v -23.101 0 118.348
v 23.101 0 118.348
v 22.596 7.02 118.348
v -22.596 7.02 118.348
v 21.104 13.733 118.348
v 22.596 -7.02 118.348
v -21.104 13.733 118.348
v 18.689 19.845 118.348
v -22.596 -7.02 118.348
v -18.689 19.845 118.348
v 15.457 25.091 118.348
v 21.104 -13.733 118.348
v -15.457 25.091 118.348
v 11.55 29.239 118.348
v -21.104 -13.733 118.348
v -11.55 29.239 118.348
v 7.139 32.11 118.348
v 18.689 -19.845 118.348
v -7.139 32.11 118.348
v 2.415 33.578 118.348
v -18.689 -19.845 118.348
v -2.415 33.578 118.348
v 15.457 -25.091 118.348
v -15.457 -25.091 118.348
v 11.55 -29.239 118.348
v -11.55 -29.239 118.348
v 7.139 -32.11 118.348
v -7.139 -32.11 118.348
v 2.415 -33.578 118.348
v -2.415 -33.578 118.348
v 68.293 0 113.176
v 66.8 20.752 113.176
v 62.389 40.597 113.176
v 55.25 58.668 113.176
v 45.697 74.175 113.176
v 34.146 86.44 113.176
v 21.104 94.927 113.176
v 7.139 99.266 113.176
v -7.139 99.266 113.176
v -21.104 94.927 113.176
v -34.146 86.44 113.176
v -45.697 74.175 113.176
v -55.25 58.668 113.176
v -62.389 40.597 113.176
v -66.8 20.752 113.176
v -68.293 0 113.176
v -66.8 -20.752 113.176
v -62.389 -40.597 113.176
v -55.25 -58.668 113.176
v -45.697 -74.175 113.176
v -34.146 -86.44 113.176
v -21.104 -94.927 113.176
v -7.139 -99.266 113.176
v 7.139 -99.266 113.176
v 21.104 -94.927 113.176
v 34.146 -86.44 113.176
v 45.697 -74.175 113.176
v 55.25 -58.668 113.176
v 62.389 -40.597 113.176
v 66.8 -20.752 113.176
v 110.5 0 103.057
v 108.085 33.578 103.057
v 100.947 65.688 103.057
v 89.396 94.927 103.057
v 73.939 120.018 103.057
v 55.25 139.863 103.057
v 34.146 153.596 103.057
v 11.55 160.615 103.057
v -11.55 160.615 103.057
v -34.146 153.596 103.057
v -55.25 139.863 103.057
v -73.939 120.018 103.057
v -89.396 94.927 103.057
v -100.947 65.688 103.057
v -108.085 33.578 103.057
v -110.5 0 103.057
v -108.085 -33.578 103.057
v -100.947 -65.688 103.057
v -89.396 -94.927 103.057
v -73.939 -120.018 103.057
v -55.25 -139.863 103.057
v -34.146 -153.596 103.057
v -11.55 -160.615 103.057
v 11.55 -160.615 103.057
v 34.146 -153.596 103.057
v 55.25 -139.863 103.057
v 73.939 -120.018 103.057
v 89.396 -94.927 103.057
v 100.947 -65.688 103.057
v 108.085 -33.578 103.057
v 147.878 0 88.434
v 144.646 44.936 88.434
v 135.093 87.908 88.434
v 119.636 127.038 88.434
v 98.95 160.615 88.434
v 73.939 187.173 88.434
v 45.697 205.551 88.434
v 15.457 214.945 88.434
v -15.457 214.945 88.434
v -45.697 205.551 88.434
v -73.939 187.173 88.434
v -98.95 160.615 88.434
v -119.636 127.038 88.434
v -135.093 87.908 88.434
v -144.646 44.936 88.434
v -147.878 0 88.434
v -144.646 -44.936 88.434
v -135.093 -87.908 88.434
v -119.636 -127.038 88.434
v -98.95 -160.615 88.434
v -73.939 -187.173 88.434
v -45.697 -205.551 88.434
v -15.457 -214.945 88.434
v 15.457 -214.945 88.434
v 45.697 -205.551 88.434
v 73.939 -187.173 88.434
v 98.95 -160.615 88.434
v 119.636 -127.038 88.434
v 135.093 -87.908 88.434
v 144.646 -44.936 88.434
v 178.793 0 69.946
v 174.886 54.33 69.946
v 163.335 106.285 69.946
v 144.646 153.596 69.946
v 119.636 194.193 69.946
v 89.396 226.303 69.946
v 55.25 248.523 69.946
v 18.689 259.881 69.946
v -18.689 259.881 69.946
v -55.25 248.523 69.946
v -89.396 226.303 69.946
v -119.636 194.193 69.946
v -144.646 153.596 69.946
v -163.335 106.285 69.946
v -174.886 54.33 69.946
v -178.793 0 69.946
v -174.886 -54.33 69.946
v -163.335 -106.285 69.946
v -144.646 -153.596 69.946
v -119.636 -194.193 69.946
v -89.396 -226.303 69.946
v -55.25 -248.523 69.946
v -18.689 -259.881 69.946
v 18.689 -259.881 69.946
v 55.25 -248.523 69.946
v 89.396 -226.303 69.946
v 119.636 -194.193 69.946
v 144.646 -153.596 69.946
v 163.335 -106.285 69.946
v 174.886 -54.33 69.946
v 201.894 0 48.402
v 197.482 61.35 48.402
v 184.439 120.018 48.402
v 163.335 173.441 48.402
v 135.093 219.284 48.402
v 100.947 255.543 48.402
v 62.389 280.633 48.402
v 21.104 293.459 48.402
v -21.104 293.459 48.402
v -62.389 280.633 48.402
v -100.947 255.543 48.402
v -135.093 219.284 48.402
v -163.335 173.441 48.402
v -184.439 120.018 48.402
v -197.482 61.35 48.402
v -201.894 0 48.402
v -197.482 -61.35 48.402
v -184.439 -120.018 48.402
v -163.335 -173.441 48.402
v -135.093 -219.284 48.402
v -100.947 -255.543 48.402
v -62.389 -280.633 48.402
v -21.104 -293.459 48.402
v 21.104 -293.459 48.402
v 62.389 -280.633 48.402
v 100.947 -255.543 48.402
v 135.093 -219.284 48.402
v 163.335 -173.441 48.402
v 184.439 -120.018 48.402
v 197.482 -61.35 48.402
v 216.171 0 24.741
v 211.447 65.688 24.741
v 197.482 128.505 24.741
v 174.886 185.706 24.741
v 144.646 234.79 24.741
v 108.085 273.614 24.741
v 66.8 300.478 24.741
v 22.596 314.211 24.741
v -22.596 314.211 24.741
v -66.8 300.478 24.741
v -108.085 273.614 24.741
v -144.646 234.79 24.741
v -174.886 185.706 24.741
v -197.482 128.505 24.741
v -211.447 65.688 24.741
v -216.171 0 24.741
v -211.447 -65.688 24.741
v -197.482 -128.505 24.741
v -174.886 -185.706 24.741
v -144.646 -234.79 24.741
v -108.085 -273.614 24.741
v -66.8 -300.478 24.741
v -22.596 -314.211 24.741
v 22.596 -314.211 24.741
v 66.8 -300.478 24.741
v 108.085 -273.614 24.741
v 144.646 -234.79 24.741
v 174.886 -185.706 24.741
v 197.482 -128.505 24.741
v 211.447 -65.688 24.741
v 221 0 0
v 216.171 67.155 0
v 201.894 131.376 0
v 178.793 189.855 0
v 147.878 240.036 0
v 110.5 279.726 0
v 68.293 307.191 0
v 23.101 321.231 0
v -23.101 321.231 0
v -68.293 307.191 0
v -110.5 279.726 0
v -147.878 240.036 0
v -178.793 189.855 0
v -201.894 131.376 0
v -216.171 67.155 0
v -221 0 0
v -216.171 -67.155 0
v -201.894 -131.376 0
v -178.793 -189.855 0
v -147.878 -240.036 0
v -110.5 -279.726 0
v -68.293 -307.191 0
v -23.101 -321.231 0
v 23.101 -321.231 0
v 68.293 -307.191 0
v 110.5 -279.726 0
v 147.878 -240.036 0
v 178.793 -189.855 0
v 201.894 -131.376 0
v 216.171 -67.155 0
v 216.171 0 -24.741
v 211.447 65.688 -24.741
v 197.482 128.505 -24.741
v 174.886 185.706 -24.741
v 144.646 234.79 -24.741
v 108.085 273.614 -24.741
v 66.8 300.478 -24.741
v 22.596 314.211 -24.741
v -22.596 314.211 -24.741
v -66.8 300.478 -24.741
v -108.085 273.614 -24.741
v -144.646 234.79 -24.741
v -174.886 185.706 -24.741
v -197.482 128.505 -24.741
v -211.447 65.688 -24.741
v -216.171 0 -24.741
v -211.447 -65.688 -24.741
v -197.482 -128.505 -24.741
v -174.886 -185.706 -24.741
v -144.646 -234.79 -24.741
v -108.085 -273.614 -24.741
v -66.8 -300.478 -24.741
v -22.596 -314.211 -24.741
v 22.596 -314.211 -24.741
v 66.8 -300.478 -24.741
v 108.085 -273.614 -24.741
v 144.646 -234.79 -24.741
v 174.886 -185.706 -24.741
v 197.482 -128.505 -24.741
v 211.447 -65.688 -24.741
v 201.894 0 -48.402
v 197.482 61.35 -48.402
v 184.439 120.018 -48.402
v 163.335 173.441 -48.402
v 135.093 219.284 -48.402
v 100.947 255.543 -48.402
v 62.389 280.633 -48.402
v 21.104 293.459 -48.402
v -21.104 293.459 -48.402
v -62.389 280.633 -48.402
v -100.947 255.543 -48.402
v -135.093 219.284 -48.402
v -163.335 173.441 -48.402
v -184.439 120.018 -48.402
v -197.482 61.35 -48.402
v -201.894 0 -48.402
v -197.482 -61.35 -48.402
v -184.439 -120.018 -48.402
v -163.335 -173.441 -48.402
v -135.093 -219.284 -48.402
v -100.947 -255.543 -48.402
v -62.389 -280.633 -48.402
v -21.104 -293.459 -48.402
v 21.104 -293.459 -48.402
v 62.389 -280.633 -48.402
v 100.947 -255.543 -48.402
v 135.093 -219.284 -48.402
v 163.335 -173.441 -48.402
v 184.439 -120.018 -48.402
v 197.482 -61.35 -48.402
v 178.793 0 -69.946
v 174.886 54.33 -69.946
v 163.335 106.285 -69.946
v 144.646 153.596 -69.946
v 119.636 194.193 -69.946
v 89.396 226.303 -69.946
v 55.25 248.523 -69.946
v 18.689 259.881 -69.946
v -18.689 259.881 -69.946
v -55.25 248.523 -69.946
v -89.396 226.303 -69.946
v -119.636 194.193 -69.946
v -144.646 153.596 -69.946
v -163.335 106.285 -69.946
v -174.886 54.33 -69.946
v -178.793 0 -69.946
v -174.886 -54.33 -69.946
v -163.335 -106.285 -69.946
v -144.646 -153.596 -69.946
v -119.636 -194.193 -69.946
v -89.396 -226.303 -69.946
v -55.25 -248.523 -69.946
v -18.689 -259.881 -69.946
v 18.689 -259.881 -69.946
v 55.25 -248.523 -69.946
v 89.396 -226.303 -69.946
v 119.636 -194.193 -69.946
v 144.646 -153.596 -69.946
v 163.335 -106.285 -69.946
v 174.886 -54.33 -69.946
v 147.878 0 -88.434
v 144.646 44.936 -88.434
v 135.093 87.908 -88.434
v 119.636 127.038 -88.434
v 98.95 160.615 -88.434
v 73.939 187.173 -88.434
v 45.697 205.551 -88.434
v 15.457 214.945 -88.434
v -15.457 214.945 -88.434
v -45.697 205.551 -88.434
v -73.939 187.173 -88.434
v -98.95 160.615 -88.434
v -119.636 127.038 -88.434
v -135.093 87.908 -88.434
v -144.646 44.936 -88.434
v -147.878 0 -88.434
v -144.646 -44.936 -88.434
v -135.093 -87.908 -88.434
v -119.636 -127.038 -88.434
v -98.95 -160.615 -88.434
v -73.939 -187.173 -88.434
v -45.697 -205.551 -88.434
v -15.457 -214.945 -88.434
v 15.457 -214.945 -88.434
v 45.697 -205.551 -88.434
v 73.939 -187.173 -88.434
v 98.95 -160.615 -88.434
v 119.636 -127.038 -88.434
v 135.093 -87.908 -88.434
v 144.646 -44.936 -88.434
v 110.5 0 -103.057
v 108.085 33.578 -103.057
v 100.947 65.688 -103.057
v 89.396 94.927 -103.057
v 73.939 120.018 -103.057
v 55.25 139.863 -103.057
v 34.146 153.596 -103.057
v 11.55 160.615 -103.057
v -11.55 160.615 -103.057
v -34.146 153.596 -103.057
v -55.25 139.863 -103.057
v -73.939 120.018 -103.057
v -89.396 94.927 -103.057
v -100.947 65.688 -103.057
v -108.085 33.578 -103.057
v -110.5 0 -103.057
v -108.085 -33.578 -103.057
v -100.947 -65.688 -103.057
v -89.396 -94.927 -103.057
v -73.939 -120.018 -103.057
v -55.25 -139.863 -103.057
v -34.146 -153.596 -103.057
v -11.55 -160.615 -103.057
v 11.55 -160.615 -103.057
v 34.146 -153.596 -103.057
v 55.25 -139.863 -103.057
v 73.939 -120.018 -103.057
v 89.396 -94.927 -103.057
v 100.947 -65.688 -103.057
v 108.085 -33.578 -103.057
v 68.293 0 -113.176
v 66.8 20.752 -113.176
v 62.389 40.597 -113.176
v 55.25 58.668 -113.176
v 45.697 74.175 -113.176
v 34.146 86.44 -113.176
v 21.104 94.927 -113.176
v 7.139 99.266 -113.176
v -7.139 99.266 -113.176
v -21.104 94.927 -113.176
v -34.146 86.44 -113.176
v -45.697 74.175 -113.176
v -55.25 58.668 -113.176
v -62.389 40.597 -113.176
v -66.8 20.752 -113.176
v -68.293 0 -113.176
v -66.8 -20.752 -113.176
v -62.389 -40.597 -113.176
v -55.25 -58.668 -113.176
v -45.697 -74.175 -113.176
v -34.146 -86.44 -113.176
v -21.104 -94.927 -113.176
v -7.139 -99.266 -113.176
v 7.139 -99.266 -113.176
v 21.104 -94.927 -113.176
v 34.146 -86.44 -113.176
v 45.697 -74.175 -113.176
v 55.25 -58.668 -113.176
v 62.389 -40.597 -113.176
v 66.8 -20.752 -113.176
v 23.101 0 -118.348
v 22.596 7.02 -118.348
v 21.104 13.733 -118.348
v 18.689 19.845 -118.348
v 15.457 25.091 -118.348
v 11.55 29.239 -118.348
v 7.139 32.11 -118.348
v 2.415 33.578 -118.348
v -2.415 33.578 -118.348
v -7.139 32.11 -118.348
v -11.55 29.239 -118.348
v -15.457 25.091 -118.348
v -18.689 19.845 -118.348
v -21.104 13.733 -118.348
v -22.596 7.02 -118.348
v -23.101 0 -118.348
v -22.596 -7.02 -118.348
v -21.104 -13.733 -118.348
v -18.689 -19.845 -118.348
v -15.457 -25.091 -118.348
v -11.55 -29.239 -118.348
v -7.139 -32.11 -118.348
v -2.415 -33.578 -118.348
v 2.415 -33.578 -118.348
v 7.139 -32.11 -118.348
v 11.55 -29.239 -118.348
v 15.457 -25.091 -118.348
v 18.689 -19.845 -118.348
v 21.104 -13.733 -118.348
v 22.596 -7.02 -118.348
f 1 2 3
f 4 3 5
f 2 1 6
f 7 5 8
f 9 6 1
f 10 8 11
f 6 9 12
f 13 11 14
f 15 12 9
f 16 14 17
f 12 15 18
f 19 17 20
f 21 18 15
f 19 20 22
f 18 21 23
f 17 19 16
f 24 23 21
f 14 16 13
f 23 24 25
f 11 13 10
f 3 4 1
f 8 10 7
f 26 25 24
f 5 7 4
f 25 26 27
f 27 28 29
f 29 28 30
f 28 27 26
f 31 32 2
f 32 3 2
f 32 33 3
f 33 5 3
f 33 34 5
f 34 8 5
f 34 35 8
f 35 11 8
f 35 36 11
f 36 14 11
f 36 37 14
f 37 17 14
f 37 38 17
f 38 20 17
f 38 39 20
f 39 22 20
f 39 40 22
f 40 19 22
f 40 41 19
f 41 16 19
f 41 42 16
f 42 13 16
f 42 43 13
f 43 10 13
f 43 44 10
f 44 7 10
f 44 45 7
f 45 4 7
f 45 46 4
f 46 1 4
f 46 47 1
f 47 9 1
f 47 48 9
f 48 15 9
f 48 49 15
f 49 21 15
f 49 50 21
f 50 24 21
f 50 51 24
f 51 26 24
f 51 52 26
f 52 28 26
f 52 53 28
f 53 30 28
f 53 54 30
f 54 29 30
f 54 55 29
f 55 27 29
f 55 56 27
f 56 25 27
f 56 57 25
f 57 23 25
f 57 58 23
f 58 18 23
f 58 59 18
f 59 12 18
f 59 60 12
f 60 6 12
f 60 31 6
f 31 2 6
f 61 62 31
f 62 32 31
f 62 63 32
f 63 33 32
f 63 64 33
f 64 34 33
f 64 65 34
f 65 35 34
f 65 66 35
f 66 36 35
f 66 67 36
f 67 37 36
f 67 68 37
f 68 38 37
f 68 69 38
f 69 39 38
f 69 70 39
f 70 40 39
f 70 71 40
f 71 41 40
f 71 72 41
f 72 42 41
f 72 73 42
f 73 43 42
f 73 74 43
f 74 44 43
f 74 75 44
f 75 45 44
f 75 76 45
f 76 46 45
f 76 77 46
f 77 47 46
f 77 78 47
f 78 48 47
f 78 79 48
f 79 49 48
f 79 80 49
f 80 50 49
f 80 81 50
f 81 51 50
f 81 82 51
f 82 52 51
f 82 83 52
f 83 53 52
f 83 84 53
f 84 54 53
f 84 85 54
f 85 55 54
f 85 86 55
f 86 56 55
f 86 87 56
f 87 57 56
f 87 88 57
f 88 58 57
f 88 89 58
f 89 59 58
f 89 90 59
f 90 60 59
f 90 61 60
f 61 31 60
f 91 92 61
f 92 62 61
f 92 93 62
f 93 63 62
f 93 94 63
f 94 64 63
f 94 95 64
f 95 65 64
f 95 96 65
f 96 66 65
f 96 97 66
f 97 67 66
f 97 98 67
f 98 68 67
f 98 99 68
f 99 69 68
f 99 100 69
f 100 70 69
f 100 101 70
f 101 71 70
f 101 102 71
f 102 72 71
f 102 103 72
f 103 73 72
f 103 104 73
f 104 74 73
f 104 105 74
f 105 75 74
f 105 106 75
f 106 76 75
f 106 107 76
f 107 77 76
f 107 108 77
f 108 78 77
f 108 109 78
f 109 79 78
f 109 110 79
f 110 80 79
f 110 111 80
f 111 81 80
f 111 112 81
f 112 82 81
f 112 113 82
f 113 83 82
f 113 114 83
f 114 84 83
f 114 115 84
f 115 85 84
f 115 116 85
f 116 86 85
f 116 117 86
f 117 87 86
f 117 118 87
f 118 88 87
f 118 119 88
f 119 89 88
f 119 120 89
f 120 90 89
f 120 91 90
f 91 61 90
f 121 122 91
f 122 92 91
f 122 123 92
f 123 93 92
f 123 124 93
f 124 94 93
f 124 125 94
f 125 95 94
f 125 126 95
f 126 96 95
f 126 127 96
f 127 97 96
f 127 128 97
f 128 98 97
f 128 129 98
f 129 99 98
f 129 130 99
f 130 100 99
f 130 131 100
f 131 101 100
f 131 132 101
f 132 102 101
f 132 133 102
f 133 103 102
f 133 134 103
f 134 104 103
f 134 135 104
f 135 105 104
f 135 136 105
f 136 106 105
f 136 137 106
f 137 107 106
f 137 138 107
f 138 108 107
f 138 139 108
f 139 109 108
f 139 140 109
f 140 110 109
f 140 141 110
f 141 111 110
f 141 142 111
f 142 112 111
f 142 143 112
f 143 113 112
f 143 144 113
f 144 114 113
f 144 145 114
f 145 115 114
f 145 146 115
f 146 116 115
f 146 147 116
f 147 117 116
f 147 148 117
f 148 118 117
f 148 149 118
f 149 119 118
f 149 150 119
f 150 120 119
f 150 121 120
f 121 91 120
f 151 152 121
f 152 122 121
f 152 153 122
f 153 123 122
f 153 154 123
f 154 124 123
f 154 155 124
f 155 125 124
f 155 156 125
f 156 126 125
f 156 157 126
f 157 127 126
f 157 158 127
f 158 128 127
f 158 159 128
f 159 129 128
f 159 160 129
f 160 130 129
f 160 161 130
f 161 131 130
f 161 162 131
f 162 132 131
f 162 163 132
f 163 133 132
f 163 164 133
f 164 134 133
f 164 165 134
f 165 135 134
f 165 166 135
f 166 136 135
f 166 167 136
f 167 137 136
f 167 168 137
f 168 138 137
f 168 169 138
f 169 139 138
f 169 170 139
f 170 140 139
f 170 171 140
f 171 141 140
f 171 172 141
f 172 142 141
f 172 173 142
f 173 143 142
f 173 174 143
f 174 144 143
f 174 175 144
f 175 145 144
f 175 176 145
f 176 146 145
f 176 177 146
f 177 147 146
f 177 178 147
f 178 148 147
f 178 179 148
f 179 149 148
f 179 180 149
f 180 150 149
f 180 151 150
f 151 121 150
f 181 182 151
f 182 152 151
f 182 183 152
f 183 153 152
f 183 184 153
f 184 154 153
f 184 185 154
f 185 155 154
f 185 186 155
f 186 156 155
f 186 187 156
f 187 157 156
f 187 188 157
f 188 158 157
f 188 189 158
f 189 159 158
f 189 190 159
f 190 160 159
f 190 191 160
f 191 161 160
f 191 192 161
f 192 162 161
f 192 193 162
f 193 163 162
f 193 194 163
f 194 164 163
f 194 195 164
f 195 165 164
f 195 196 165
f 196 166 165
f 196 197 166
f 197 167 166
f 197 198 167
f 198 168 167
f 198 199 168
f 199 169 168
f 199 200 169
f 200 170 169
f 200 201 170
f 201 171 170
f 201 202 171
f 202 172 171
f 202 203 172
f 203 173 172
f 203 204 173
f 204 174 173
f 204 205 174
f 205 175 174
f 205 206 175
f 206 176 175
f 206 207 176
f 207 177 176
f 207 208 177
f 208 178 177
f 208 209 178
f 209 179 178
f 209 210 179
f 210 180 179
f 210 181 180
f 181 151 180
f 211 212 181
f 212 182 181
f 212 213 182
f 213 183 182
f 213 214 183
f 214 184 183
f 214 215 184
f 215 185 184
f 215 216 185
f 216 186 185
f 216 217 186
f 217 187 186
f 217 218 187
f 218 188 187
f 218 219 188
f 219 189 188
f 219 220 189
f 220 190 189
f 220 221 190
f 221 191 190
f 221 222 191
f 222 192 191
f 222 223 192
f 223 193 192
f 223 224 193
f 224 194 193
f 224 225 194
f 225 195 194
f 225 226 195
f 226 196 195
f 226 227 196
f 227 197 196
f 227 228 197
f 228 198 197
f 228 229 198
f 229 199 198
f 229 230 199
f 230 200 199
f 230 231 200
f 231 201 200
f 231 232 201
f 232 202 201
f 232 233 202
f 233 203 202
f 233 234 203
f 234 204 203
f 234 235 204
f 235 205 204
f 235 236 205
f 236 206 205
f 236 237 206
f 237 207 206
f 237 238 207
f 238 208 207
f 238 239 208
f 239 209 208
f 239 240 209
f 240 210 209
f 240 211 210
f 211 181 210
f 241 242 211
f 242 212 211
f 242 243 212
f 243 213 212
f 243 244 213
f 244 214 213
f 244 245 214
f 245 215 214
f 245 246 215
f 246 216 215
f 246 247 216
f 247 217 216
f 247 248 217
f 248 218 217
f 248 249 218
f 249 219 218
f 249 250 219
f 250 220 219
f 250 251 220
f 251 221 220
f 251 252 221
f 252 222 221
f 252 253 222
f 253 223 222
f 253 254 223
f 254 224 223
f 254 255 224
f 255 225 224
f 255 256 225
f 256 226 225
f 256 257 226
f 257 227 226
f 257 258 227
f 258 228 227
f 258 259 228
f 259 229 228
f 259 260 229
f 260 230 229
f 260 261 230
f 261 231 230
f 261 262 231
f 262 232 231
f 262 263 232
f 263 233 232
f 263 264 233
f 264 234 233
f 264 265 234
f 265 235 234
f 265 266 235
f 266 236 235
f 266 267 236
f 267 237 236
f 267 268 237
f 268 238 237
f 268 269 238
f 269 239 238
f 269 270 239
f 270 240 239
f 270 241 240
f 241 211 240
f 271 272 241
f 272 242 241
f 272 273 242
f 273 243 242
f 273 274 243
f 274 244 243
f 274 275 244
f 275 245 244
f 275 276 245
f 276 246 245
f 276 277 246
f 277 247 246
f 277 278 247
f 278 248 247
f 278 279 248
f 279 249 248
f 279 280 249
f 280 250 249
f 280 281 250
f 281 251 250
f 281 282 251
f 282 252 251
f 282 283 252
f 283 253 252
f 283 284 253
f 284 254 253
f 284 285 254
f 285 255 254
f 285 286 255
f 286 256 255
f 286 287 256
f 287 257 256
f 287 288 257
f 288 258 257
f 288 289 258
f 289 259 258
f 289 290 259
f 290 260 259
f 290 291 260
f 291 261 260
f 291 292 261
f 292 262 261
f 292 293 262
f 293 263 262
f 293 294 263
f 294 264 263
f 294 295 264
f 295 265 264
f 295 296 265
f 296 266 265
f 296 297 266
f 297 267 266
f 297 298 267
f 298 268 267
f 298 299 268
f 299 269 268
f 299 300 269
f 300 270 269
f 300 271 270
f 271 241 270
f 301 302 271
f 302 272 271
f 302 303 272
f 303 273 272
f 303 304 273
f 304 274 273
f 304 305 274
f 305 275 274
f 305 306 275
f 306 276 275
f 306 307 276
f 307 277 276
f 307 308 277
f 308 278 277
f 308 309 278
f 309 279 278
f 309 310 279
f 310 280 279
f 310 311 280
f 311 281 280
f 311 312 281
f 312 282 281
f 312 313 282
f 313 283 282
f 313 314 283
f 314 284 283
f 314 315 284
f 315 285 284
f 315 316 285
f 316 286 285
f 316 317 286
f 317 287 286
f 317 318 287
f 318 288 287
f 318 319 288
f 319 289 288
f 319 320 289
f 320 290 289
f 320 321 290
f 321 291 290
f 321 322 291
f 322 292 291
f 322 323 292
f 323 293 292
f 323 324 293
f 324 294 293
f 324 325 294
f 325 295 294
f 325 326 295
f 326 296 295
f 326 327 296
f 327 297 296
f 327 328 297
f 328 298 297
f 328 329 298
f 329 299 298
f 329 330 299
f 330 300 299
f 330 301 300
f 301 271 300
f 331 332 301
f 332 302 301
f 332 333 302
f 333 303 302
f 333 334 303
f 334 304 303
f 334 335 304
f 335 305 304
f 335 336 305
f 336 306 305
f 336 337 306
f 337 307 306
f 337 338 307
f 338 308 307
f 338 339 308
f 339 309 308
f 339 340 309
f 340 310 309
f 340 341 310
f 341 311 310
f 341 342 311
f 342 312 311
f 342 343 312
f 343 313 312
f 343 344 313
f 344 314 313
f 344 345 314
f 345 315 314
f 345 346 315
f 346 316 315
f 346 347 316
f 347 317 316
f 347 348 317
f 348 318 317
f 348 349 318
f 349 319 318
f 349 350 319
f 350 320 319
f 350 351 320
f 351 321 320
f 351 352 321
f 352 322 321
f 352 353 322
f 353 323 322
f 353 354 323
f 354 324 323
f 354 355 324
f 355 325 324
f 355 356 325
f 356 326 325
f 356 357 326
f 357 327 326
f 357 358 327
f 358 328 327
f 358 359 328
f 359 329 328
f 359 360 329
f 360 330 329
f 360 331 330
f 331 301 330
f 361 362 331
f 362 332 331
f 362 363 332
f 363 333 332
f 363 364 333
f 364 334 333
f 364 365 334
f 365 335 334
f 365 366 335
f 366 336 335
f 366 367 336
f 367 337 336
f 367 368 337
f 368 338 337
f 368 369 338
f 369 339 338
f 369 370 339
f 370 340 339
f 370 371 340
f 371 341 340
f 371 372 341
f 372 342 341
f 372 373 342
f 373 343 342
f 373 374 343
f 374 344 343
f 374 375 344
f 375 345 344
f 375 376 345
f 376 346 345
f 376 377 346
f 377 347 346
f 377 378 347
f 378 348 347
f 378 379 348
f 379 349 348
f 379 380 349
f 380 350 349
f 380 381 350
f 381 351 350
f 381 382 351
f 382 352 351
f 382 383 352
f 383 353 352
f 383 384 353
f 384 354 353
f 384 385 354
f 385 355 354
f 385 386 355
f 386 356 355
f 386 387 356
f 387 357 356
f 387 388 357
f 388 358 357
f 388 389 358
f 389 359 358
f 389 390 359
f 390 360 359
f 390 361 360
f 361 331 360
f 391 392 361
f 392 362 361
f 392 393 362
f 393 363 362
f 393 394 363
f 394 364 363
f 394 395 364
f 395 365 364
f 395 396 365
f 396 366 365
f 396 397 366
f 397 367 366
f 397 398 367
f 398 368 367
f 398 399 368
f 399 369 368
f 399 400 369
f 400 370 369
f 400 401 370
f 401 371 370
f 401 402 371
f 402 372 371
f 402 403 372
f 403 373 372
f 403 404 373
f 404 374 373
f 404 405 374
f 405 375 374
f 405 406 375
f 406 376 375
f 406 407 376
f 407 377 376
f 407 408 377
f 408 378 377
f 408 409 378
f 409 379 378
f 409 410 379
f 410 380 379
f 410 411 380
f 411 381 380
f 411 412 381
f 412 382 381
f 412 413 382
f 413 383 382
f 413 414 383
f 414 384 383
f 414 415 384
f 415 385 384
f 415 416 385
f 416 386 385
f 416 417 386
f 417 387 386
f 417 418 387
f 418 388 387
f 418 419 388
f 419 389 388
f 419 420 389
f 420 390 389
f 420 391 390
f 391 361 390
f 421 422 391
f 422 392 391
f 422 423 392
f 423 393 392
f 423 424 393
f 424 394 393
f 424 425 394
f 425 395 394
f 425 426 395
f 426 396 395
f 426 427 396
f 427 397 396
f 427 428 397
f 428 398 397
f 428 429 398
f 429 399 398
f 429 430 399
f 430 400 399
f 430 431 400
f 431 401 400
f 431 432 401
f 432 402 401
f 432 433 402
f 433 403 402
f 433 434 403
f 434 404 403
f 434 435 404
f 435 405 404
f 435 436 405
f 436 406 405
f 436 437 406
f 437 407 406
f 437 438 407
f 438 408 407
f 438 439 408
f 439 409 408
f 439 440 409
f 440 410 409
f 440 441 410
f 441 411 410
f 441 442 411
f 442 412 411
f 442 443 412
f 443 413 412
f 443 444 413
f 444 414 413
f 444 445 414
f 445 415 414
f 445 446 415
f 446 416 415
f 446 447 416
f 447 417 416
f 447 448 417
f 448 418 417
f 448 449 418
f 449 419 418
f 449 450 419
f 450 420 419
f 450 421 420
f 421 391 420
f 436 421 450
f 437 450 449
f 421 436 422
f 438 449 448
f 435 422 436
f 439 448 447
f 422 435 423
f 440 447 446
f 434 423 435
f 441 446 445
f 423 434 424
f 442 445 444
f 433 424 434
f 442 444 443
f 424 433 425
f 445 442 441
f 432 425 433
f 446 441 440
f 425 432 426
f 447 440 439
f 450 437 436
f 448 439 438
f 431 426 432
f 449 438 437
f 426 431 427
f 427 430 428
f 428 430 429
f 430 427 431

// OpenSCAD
// Generated by SolidPython 1.0.1 on 2020-07-29 00:46:51


scale(v = [13, 19, 7]) {
	sphere(r = 17);
}
/***********************************************
*********      SolidPython code:      **********
************************************************
 
# import packages: SolidPython
from solid import *
from solid.utils import *
from itertools import chain, combinations, permutations


class Resize:

    def __init__(self, scad_file):
        self.scad_file = scad_file
        #self.scad_file = import_scad(scad_file)
        # cone/cylinder param:
        self.r1 = 0
        self.r2 = 0
        self.h = 0
        # rectangular prism param:
        self.w = 0
        self.l = 0
        # ellipse param:
        self.r = 0

    # import OpenScad code (file name corresponds to shape)


    # classify shape + parameters
    def assign(self, param1, param2, param3):
        if self.scad_file == 'cone.scad':
            self.r1 = param1
            self.r2 = param2
            self.h = param3
        elif self.scad_file == 'cylinder.scad':
            self.r1 = param1
            self.r2 = param2
            self.h = param3
        elif self.scad_file == 'rectangularPrism.scad':
            self.h = param1
            self.l = param2
            self.w = param3
        else:
            self.r = param1
            self.h = param2

    # resize parameters
    def iterate(self):
        x = range(3, 20, 2)
        i = 1
        if self.scad_file == 'cone.scad':
            tempList = list(permutations(x, 2))
            for temp in tempList:
                param1 = temp[0]
                param2 = temp[1]
                filepath = 'produced_scad_files/' + 'cone' + str(param1) + '_' + str(param2) + '_' + '.scad'
                scad_render_to_file(cylinder(h=param1, r1=param2, r2=0), filepath)

        elif self.scad_file == 'cylinder.scad':
            tempList = list(permutations(x, 3))
            for temp in tempList:
                param1 = temp[0]
                param2 = temp[1]
                filepath = 'produced_scad_files/' + 'cylinder' + str(param1) + '_' + str(param2) + '_' + '.scad'
                scad_render_to_file(cylinder(h=param1, r1=param2, r2=param2), filepath)

        elif self.scad_file == 'rectangularPrism.scad':
            tempList = list(permutations(x, 3))
            for temp in tempList:
                param1 = temp[0]
                param2 = temp[1]
                param3 = temp[2]
                filepath = 'produced_scad_files/' + 'rectangularPrism' + str(param1) + '_' + str(param2) + '_' + str(
                    param3) + '.scad'
                scad_render_to_file(cube(size=(param1, param2, param3)), filepath)

        elif self.scad_file == 'ellipse.scad':
            tempList = list(permutations(x, 4))
            for temp in tempList:
                param1 = temp[0]
                param2 = temp[1]
                param3 = temp[2]
                param4 = temp[3]
                filepath = 'produced_scad_files/' + 'ellipse' + str(param1) + '_' + str(param2) + '_' + str(param3) + '_' + str(param4) + '.scad'
                scad_render_to_file(scale([param1, param2, param3])(sphere(r=param4)), filepath)

    def render_to_scadfile(self):
        scad_render_to_file(scad, 'example.scad') 
 
************************************************/
